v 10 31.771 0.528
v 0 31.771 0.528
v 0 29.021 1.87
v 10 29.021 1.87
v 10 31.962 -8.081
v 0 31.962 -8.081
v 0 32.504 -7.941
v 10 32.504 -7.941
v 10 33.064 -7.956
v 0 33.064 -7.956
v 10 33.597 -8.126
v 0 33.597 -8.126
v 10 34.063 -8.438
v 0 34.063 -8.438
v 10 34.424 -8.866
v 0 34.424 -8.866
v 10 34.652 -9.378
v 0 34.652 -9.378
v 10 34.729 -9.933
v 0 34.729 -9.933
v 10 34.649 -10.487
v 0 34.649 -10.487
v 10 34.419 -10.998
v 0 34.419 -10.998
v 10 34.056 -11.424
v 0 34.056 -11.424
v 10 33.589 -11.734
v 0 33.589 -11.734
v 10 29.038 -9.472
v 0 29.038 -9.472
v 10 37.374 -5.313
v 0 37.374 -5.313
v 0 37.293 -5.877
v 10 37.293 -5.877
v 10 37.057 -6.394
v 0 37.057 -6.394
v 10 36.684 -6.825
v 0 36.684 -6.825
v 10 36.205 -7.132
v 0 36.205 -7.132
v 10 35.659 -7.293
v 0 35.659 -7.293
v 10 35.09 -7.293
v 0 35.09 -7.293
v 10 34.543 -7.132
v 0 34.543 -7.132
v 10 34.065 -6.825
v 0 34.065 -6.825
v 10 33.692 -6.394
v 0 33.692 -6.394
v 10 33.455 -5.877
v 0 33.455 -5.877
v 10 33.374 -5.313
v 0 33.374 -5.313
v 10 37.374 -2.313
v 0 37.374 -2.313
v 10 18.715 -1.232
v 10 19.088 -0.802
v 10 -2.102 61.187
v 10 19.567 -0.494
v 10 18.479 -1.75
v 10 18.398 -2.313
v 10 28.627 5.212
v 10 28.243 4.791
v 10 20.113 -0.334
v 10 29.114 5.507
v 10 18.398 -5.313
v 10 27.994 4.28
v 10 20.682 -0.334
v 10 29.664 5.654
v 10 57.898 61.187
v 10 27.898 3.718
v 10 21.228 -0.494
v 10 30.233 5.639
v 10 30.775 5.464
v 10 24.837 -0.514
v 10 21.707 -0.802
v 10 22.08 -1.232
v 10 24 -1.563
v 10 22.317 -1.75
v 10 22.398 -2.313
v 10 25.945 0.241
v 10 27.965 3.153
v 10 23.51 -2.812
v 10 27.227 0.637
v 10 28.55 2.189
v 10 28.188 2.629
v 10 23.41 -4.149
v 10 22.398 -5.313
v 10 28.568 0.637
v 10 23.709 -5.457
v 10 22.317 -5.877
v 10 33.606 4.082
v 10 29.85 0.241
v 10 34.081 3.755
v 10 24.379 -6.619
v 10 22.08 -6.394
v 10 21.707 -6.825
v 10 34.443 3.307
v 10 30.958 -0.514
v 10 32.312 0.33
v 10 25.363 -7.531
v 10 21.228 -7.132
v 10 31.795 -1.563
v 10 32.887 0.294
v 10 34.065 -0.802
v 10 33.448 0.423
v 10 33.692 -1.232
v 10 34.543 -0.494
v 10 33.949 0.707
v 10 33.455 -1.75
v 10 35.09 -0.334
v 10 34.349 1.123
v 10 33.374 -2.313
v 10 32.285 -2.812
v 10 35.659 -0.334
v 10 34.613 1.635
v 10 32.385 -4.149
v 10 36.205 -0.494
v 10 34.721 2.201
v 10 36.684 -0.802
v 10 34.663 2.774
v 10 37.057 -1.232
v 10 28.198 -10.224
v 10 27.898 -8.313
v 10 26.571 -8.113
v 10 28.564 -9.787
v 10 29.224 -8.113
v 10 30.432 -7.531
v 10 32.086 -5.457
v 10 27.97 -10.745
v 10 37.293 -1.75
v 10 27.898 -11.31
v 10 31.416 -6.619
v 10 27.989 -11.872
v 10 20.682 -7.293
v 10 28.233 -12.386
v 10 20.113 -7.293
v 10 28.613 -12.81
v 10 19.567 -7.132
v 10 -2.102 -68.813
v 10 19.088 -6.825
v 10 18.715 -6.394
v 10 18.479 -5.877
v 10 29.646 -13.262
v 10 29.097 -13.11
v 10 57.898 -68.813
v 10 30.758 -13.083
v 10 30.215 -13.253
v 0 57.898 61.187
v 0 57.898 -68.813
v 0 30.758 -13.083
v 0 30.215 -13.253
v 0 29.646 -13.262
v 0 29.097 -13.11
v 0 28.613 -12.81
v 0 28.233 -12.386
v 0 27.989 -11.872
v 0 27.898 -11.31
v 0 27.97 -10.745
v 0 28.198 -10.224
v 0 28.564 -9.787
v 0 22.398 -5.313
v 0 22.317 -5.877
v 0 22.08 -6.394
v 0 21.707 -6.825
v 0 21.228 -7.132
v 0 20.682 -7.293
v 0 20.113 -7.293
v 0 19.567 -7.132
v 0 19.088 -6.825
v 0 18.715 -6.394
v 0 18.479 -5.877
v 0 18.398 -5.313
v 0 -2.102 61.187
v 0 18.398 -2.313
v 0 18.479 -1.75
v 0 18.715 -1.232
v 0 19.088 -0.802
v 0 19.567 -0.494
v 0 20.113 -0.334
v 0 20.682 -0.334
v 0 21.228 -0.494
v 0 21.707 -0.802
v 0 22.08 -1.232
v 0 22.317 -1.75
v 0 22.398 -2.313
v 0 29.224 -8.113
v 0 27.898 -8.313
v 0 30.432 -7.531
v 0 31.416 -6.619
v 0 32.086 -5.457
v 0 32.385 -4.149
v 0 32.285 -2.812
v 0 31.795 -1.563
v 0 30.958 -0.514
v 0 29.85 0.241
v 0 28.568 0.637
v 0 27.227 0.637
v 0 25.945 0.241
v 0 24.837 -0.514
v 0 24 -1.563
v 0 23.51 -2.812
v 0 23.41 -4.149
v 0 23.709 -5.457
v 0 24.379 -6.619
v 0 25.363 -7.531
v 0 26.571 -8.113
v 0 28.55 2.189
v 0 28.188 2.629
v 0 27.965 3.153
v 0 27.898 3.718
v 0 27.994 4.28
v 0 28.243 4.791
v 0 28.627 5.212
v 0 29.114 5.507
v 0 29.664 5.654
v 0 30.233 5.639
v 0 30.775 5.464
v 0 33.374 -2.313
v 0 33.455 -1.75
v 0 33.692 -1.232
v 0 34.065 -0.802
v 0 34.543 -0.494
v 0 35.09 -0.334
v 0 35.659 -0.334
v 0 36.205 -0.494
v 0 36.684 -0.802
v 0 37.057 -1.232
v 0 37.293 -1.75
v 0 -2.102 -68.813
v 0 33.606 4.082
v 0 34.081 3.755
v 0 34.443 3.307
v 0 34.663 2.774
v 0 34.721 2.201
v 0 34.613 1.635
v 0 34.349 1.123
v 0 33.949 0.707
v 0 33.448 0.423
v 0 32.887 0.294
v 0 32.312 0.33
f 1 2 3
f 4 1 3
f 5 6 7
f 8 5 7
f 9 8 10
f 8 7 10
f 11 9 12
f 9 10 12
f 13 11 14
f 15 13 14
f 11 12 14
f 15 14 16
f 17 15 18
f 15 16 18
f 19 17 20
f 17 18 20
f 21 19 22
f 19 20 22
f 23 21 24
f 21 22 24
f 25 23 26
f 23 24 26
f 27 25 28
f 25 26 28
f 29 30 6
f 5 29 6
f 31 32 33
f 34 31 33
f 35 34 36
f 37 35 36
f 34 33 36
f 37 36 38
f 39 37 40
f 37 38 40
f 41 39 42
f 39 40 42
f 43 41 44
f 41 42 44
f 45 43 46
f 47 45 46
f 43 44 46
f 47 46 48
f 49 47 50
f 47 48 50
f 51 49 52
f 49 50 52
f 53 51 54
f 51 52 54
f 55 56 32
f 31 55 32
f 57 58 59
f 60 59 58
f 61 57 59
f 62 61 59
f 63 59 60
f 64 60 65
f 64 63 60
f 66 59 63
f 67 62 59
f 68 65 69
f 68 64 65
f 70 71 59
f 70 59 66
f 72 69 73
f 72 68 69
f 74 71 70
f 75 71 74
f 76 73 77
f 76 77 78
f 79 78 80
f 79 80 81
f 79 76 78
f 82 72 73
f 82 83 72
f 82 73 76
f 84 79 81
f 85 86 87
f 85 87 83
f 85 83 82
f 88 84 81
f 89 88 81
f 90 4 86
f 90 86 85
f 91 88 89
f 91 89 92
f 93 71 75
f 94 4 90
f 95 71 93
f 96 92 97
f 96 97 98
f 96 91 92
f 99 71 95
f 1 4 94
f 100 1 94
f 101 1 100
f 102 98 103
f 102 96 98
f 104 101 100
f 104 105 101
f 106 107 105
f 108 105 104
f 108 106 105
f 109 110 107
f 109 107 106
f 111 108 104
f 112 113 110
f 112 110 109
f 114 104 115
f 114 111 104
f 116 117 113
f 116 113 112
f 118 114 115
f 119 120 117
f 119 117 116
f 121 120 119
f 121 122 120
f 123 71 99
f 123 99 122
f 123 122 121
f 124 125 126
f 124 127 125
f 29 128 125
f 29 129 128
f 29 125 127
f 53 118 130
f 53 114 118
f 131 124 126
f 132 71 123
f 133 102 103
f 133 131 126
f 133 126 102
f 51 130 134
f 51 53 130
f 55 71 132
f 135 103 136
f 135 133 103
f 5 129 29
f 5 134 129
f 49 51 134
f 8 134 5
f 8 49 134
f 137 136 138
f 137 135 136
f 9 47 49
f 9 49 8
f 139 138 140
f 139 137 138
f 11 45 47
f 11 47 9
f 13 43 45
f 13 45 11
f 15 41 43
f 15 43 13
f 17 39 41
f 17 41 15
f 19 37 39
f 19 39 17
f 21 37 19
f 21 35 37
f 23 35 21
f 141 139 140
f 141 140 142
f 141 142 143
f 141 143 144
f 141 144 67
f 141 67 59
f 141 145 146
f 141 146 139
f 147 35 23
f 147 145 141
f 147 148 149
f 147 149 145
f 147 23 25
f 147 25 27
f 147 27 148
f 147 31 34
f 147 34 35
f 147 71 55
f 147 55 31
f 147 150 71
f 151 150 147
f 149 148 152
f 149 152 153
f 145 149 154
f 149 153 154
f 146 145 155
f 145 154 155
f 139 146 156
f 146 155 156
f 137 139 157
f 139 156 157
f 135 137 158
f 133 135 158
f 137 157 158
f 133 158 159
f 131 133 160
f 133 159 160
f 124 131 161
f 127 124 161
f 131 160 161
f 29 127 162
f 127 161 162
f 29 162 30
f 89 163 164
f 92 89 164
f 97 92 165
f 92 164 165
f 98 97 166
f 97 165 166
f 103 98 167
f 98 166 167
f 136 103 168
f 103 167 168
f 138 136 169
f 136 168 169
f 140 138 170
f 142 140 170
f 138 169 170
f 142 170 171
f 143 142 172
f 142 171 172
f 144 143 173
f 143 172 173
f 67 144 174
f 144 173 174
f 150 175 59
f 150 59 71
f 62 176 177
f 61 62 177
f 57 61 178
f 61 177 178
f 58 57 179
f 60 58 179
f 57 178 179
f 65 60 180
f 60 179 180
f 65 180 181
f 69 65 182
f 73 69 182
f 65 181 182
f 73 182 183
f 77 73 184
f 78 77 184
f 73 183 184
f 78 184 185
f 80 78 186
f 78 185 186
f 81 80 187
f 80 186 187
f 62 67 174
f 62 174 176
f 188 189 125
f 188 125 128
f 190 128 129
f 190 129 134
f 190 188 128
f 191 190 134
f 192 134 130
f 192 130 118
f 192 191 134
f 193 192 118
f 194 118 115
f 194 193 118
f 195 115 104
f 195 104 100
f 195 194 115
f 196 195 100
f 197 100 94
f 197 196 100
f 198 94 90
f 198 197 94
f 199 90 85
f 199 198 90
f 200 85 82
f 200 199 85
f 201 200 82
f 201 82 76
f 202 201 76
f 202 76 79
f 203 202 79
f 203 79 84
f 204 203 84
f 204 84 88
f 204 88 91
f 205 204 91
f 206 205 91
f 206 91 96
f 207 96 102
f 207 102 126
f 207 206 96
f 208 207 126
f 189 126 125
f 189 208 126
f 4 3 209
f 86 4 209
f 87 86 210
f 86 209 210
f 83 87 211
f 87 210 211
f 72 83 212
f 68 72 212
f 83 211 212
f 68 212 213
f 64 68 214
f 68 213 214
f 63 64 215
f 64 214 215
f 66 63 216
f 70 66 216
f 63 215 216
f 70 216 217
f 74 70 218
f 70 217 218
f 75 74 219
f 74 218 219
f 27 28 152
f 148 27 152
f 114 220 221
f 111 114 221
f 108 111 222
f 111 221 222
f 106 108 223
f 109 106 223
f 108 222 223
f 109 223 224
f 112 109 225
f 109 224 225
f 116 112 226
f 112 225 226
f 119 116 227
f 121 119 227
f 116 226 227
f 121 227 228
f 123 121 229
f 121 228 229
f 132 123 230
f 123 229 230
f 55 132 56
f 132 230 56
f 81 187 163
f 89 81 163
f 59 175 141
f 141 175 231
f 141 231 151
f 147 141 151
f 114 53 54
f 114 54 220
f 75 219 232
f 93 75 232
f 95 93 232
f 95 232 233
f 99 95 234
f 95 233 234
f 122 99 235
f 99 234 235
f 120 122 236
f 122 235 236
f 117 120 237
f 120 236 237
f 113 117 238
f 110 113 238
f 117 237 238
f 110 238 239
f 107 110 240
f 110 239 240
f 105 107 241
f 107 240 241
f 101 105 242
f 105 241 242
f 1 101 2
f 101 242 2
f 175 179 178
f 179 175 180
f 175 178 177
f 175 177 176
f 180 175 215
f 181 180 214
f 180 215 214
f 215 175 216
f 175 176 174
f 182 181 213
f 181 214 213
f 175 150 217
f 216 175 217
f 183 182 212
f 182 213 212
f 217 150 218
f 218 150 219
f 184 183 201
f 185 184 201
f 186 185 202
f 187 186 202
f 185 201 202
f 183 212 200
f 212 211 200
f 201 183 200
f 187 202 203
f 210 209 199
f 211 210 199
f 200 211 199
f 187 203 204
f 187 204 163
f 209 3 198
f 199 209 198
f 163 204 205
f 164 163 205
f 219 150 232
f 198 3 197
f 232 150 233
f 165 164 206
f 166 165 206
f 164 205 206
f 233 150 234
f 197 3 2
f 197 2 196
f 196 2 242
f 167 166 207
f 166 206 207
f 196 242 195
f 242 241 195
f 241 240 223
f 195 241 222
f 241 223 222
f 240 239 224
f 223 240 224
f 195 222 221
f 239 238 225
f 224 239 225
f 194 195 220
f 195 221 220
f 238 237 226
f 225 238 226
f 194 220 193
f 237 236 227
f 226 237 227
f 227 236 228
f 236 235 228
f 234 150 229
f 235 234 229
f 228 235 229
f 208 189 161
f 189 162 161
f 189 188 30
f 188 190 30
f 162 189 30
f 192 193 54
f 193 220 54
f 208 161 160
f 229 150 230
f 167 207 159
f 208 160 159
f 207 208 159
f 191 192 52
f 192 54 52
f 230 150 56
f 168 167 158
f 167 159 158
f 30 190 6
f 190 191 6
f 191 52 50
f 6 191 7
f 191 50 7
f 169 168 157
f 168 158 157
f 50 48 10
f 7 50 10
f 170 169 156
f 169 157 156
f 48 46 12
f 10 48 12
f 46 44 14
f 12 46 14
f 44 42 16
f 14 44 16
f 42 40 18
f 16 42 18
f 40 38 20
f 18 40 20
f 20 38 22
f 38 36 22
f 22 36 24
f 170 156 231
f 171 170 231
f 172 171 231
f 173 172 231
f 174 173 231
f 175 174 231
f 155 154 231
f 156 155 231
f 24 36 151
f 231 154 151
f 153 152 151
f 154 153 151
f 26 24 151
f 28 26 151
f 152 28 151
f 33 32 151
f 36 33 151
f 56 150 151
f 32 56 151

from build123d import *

# Parameters (mm, degrees)
SKETCH1_W           = 130
SKETCH1_H           = 60
SKETCH1_R           = 4.499999999
BOSS_EXTRUDE1_DEPTH = 10


with BuildPart() as part:
    # Sketch1 → Boss-Extrude1 (new body)
    with BuildSketch(Plane(origin=(0, 0, 0), x_dir=(0, 0, -1), z_dir=(1, 0, 0))):
        with Locations((3.813160791, 27.897530874)):
            Rectangle(SKETCH1_W, SKETCH1_H)
        with Locations((3.813160791, 27.897530874)):
            Circle(SKETCH1_R, mode=Mode.SUBTRACT)
        with BuildLine():
            Line((-5.464379102, 30.775341326), (-4.081605515, 33.606305024))
            ThreePointArc((-4.081605515, 33.606305024), (-1.369183898, 34.499769949), (-0.528409533, 31.770555947))
            Line((-0.528409533, 31.770555947), (-1.869576404, 29.020756356))
            ThreePointArc((-1.869576404, 29.020756356), (-4.544523089, 28.10012945), (-5.464379102, 30.775341326))
        make_face(mode=Mode.SUBTRACT)
        with BuildLine():
            Line((5.31316079, 18.397530874), (2.313160791, 18.397530874))
            ThreePointArc((2.313160791, 18.397530874), (0.313160792, 20.397530874), (2.313160791, 22.397530873))
            Line((2.313160791, 22.397530873), (5.31316079, 22.397530873))
            ThreePointArc((5.31316079, 22.397530873), (7.313160789, 20.397530874), (5.31316079, 18.397530874))
        make_face(mode=Mode.SUBTRACT)
        with BuildLine():
            Line((5.31316079, 33.374248764), (2.313160791, 33.374248764))
            ThreePointArc((2.313160791, 33.374248764), (0.31316079, 35.374248765), (2.313160791, 37.374248765))
            Line((2.313160791, 37.374248765), (5.31316079, 37.374248765))
            ThreePointArc((5.31316079, 37.374248765), (7.313160791, 35.374248765), (5.31316079, 33.374248764))
        make_face(mode=Mode.SUBTRACT)
        with BuildLine():
            Line((9.471997672, 29.038205562), (8.081045524, 31.961596177))
            ThreePointArc((8.081045524, 31.961596177), (9.113942414, 34.555839775), (11.733632625, 33.589300054))
            Line((11.733632625, 33.589300054), (13.083423708, 30.758314735))
            ThreePointArc((13.083423708, 30.758314735), (12.137765277, 28.092547131), (9.471997672, 29.038205562))
        make_face(mode=Mode.SUBTRACT)
    extrude(amount=BOSS_EXTRUDE1_DEPTH)


solid = part.part
